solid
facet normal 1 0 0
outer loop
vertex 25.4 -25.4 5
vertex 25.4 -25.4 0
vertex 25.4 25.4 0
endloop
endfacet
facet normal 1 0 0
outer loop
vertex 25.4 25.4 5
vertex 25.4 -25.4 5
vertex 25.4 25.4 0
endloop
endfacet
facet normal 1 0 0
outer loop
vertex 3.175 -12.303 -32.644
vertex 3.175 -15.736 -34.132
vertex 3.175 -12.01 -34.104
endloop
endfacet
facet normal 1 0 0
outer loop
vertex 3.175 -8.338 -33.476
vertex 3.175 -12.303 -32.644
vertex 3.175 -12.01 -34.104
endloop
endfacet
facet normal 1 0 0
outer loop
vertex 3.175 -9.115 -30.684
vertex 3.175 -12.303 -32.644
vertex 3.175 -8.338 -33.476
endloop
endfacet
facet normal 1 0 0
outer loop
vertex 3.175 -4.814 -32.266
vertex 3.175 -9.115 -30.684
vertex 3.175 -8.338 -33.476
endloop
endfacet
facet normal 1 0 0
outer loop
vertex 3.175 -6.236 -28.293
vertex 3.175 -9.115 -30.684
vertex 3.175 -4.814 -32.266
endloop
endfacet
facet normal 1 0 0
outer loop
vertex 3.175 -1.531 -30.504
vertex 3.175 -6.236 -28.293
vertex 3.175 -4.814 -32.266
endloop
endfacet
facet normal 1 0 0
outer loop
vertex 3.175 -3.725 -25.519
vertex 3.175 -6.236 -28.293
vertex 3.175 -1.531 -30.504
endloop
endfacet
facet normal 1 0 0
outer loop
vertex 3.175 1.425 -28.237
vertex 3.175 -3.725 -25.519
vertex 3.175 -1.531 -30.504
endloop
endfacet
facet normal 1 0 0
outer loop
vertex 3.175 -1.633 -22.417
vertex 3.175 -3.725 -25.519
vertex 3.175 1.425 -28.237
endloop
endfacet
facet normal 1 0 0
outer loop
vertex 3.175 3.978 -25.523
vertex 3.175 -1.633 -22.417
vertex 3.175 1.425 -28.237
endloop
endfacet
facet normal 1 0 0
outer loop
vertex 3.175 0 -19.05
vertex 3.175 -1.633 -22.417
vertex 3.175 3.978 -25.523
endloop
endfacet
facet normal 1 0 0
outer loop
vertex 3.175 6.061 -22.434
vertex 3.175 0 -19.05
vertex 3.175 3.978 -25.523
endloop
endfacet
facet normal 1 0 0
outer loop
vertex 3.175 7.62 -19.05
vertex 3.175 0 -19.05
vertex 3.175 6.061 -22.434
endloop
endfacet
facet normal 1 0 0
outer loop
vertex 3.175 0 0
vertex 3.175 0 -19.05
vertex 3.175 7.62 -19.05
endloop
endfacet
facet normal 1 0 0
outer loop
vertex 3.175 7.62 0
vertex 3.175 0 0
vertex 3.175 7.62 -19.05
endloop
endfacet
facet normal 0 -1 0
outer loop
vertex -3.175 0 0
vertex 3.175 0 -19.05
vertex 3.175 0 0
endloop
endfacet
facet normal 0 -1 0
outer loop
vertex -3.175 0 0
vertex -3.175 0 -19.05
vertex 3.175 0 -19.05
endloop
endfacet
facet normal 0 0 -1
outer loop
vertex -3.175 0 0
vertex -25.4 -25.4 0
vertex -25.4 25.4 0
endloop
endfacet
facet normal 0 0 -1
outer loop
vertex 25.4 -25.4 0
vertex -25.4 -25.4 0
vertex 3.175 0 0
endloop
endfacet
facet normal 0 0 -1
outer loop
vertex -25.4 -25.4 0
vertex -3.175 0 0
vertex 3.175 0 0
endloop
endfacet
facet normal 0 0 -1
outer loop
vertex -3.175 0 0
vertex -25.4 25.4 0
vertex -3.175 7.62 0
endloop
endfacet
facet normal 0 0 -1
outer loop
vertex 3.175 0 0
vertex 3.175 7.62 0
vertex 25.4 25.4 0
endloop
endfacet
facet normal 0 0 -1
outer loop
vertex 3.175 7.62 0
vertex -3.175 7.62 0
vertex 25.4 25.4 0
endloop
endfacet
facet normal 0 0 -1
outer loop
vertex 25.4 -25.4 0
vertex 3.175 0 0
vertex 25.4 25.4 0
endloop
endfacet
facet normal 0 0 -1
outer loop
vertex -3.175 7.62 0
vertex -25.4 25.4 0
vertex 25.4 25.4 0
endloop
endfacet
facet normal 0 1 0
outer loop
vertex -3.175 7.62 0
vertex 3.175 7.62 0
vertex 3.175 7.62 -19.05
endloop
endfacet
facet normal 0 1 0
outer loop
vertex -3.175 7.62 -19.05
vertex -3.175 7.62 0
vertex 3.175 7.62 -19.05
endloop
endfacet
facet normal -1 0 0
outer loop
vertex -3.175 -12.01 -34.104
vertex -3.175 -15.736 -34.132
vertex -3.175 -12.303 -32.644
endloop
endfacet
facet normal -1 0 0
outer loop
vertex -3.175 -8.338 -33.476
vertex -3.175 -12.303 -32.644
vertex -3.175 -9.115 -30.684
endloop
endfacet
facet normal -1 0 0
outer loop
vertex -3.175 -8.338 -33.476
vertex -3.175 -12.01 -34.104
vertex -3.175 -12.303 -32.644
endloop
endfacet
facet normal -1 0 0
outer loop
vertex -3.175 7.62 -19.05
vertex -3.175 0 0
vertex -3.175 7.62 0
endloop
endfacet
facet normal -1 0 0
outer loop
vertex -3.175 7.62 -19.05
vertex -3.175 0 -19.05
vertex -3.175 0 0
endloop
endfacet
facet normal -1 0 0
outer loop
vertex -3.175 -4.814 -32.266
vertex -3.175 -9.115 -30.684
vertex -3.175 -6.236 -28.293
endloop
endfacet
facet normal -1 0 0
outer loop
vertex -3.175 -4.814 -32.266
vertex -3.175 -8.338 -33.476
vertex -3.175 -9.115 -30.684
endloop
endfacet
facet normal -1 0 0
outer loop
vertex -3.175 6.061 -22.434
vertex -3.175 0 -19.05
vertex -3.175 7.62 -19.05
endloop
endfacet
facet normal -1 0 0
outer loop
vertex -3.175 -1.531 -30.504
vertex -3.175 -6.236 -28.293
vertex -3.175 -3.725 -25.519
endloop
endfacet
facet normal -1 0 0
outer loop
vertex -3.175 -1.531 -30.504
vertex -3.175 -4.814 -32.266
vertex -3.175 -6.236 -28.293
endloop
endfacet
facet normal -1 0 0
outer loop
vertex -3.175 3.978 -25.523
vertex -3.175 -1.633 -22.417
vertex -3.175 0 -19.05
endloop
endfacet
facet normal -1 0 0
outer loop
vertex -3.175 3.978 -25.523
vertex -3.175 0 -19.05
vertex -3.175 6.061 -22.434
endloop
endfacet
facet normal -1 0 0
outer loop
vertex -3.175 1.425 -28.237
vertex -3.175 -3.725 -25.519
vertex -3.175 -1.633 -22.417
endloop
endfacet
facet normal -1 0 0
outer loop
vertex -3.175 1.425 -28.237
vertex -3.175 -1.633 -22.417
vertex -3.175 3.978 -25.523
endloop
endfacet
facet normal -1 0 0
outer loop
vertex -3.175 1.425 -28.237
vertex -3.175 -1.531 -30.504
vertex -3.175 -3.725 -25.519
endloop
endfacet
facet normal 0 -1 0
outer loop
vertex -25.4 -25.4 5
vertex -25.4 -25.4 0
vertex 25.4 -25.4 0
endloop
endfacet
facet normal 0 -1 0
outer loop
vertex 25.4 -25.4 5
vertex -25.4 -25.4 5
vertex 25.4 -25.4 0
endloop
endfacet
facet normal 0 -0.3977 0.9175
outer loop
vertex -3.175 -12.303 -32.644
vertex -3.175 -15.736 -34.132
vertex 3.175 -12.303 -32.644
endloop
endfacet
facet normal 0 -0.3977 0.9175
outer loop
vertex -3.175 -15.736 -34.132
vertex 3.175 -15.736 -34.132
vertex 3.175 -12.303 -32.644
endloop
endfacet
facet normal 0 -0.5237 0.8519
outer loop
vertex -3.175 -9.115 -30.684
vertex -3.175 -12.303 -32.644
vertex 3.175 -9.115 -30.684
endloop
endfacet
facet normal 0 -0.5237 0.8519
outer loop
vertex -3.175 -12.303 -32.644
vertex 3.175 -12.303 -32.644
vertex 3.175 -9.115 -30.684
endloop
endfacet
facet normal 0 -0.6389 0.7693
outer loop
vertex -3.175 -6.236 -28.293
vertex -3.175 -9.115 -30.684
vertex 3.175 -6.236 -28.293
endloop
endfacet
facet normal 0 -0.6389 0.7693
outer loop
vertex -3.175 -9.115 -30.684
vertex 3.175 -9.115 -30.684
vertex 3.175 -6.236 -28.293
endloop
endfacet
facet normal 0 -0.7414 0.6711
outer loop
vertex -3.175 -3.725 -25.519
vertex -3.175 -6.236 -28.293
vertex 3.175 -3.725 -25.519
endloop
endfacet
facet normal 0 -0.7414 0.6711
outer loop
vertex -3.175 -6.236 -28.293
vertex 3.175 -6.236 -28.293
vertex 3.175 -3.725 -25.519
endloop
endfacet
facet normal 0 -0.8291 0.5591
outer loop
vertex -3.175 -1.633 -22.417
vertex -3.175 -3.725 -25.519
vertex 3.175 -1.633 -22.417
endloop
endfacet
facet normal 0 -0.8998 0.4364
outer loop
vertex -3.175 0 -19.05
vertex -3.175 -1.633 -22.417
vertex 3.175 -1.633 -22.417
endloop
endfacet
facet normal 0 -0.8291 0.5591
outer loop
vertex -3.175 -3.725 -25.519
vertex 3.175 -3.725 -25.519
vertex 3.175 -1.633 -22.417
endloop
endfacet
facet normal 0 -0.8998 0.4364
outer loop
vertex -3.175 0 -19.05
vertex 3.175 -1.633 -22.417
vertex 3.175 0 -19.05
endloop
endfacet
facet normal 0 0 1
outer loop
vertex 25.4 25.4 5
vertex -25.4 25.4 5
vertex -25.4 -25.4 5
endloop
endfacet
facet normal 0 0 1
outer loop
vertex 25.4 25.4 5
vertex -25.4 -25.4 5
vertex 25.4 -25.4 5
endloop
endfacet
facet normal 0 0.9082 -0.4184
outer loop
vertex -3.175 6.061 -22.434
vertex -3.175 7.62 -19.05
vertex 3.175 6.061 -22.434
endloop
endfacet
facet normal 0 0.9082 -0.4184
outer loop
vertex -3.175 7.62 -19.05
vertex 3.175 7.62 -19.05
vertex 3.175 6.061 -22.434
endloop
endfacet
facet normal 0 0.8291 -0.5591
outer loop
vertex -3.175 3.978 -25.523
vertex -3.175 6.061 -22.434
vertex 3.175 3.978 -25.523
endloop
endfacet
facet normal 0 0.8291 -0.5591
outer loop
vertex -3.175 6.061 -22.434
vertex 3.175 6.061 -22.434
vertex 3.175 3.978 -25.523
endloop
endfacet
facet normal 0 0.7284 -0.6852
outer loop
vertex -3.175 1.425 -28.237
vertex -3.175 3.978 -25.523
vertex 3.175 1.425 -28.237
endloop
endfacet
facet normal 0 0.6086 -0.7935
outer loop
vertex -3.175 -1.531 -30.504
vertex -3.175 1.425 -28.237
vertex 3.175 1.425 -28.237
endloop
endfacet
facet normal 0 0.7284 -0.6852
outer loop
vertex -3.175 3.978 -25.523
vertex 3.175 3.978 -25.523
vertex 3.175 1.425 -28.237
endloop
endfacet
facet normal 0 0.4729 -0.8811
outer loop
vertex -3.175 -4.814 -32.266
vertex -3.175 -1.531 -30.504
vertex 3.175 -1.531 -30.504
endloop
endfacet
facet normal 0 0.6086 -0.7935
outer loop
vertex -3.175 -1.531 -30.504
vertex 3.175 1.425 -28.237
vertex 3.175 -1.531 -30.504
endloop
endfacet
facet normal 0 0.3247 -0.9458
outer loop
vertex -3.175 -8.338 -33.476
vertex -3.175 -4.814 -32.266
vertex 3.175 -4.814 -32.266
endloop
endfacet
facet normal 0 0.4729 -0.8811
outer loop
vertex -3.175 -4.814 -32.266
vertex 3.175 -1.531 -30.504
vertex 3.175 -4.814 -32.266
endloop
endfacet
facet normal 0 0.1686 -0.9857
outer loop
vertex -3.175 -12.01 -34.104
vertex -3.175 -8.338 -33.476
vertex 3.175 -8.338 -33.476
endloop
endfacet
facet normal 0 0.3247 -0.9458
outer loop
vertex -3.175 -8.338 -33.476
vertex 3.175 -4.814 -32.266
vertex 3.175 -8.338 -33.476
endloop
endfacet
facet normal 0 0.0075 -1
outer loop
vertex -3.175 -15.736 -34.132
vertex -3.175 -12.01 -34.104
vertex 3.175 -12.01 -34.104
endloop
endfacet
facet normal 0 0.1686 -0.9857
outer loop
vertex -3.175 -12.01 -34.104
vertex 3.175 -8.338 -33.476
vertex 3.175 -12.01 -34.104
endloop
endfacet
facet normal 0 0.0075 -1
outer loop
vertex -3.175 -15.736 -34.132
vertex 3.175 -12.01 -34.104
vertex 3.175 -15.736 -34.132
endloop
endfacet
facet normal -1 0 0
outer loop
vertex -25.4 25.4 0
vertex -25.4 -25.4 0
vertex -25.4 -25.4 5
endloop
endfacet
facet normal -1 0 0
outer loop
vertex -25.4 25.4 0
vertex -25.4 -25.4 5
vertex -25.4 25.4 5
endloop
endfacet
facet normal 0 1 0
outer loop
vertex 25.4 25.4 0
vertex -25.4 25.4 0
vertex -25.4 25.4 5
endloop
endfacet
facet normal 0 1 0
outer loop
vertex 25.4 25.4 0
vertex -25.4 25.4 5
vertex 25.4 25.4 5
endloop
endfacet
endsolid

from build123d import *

# Parameters (mm, degrees)
F0_W     = 50.8
F0_H     = 50.8
F1_DEPTH = 5
F2_W     = 7.62
F2_H     = 19.05
F3_DEPTH = 3.175
F4_DEPTH = 3.175


with BuildPart() as f1:
    # F0 (on Top) → F1 (new body)
    with BuildSketch(Plane.XY):
        Rectangle(F0_W, F0_H)
    extrude(amount=F1_DEPTH)

    # F2 (on Right) → F3 (join)
    with BuildSketch(Plane.YZ):
        with Locations((3.81, -9.525)):
            Rectangle(F2_W, F2_H)
        with BuildLine():
            Line((7.62, -19.05), (0, -19.05))
            ThreePointArc((0, -19.05), (-6.23626, -28.293401), (-15.736038, -34.131691))
            ThreePointArc((-15.736038, -34.131691), (-1.531188, -30.503985), (7.62, -19.05))
        make_face()
    extrude(amount=F3_DEPTH)

    # F3_face (on face) → F4 (join)
    with BuildSketch(Plane(origin=(0, 1.478785, -16.812589), x_dir=(0, 1, 0), z_dir=(-1, 0, 0))):
        with BuildLine():
            Line((-1.478785, -16.812589), (6.141215, -16.812589))
            Line((6.141215, -16.812589), (6.141215, 2.237411))
            ThreePointArc((6.141215, 2.237411), (-3.009973, 13.691396), (-17.214823, 17.319102))
            ThreePointArc((-17.214823, 17.319102), (-7.715045, 11.480812), (-1.478785, 2.237411))
            Line((-1.478785, 2.237411), (-1.478785, -16.812589))
        make_face()
    extrude(amount=F4_DEPTH)


solid = f1.part
